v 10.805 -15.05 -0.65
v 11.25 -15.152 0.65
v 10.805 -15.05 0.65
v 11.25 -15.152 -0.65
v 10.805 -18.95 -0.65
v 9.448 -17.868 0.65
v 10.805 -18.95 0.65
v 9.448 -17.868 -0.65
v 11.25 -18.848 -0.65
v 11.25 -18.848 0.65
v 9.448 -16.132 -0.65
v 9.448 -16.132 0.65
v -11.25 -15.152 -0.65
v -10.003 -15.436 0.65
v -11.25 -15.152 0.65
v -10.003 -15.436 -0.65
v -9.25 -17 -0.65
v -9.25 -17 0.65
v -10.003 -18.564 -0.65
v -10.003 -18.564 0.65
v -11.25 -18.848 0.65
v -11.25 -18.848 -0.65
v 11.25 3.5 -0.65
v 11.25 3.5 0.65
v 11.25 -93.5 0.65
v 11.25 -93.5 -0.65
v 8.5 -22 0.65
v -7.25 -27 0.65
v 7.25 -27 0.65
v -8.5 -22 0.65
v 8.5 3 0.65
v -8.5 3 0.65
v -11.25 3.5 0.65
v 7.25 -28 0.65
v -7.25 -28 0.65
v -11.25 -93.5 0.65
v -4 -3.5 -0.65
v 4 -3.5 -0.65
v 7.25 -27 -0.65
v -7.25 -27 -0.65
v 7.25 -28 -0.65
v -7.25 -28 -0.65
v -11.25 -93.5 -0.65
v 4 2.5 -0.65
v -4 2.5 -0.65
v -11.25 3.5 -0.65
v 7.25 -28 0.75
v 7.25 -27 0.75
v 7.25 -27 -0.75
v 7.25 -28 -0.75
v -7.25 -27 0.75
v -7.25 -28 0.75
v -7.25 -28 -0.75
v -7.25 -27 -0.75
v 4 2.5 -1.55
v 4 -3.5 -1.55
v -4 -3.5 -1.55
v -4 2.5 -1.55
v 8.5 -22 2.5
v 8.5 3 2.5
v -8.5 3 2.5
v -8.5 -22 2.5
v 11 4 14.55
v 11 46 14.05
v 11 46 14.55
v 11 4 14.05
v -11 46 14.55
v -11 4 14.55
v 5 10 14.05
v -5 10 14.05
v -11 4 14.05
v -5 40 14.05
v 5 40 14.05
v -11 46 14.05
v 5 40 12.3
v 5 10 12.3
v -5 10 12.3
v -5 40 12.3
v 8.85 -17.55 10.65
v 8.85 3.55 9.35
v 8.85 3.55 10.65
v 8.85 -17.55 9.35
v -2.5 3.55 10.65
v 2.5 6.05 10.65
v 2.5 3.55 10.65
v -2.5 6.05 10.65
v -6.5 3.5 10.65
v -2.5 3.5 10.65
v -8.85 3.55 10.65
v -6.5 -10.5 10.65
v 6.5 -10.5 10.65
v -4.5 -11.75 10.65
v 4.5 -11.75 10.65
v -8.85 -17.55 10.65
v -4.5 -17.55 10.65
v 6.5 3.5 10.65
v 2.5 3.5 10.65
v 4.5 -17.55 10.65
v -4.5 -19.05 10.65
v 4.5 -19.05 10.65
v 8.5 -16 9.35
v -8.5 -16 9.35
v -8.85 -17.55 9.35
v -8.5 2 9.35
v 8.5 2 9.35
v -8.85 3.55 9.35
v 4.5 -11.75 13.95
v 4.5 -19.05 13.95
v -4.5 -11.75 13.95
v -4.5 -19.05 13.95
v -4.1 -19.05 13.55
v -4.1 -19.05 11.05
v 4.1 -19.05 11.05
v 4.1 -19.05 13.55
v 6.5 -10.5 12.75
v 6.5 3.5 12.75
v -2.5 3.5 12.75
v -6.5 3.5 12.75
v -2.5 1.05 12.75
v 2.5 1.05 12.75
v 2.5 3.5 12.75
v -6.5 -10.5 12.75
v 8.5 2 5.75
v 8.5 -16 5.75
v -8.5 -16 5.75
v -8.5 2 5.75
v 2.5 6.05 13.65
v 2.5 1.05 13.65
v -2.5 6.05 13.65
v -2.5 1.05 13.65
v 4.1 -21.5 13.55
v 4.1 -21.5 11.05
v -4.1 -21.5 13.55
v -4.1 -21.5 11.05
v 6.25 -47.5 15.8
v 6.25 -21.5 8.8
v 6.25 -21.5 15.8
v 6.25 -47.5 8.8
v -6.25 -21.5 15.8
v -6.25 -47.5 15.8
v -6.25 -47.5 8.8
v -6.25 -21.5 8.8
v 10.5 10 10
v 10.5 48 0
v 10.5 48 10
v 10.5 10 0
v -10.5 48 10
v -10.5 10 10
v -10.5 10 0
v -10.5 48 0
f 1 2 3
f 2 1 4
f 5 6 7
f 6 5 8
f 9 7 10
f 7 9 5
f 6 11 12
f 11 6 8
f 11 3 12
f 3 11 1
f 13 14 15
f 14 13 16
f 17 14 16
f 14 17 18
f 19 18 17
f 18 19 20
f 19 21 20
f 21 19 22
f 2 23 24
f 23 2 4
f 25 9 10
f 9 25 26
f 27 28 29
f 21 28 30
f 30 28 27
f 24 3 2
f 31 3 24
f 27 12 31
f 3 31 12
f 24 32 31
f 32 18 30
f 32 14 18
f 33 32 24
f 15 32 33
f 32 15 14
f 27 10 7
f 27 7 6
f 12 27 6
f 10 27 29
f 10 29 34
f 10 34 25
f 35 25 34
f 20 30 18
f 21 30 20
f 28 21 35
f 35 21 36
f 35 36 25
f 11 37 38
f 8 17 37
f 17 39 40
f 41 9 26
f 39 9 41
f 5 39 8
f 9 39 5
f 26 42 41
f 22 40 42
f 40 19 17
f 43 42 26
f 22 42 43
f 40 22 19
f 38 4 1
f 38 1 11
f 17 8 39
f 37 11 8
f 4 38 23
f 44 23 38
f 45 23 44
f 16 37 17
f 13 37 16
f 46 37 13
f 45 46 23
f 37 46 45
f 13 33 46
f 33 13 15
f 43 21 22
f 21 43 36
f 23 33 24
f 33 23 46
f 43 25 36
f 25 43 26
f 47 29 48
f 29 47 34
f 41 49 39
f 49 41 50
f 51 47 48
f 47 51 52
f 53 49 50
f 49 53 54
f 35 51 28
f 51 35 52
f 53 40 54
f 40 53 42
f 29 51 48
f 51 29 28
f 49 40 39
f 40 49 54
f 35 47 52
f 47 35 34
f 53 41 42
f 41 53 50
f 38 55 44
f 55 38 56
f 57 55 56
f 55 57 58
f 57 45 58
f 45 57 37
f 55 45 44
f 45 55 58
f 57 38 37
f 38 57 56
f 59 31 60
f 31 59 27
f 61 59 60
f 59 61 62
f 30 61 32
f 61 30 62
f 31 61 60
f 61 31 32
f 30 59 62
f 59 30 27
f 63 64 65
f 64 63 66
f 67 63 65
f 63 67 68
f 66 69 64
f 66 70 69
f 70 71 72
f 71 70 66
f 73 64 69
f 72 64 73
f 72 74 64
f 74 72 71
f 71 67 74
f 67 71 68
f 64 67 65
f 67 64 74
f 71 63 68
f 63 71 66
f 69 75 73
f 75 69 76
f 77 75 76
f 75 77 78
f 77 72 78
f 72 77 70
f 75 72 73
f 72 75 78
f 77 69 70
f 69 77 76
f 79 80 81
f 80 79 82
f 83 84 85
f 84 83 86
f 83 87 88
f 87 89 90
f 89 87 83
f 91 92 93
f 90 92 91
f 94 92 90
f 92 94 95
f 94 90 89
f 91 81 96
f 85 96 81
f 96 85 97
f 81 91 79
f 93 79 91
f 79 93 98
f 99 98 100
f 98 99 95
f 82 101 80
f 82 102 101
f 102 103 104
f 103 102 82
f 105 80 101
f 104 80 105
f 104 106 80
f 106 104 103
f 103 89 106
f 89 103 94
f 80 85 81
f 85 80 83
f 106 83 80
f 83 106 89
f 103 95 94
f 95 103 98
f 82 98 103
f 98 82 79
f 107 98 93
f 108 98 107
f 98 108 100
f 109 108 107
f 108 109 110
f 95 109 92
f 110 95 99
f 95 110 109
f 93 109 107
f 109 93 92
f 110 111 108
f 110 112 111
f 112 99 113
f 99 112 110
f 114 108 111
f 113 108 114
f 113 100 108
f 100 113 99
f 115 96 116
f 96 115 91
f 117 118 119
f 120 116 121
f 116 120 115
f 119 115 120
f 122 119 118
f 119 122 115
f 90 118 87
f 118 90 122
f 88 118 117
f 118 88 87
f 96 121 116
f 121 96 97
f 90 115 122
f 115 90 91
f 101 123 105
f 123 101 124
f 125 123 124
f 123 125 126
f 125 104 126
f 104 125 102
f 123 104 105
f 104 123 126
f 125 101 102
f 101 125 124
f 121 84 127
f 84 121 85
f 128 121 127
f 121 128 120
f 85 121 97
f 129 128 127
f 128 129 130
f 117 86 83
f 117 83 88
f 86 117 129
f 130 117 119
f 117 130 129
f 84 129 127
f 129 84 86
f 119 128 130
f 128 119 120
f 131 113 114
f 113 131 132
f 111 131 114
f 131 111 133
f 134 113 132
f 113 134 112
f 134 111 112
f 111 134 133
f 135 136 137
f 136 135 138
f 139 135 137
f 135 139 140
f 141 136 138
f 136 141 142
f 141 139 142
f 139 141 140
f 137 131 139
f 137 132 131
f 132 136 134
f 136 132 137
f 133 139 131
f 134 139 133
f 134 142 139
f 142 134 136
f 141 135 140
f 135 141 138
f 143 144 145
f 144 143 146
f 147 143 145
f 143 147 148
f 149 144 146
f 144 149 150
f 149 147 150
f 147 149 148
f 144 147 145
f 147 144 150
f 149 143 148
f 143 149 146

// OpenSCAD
use <MCAD/boxes.scad>

//$fn=100;

// large battery 1200mAh : 63
// small battery  600mAh : 38
module battery(length, tol=0) {
    cube([21+tol,length+tol,10+tol],center=true);
}

function inc(arr,tol) = [arr[0]+tol,arr[1]+tol,arr[2]+tol];
function incA(arr,tol) = [arr[0]+tol[0],arr[1]+tol[1],arr[2]+tol[2]];

module esp32(tol=0) {
    pcb=[17.7,21.1,1.3];
    usb=[9,7.3,3.3];
    chip=[13,14,2.1];
    resistors=[17,18,3.6];

    union() {
      // PCB
      cube(inc(pcb, tol), center=true);    
      // USB
      translate([0,-pcb[1]/2+usb[1]/2-1.5,usb[2]/2+pcb[2]/2])
       cube(inc(usb, tol), center=true);    
      // chips
      translate([0,+3.5,chip[2]/2+pcb[2]/2])
       cube(chip, center=true);
      // place for resistors (voltage and battery cables)
      translate([0,0,-resistors[2]/2-pcb[2]/2])
       cube(inc(resistors, tol), center=true);
      // BLE antenna connector
      translate([0,pcb[1]/2,pcb[2]/2+1.5])
       cube(inc([5,5,3], tol), center=true);


    }
}

module antenna(tol=[0,0,0]) {
    union(){        
     cube(incA([22,42,0.5], tol),center=true);
     translate([0,0,-1])        
      cube(incA([10,30,2], tol),center=true);
    }
}

module sensor(tol=0, do_hole=true) {
    pcb=[22.5,97,1.3];
    union() {
      difference() {
        cube(inc(pcb, tol), center=true);    
        if (do_hole) {
          translate([+pcb[0]/2,pcb[1]/2-20.5,0])
            cylinder(6,r=4/2,center=true);
          translate([-pcb[0]/2,pcb[1]/2-20.5,0])
            cylinder(6,r=4/2,center=true);
        }
      }
      // limit line
      translate([0,pcb[1]/2-31,0])
        cube([pcb[0]-8,1,pcb[2]+0.2],center=true);
      // soudures
      translate([0,pcb[1]/2-4,-pcb[2]/2+0.1])
        cube([8,6,2],center=true);
      // chip
      translate([0,pcb[1]/2-13,1.5])
        cube([17,25,2],center=true);
    }
}


module cable(tol=0) {
   translate([0,-4,0])
     cube(inc([8.2,8,2.5],tol),center=true);// usb
   translate([0,-18.9,0])
     cube(inc([12.5,30-4,7],tol),center=true); // plug
}

module model(batt_length, tol=0) {
  translate([0,-45,0])
    sensor(tol);  
    
  translate([0,25,14.3])
    antenna([tol,tol,tol]);    
  translate([0,10+batt_length/2,5])
    battery(batt_length,tol);

  translate([0,0,2]) {
    translate([0,-7,8])
      rotate([0,0,0])
        esp32(tol);
    translate([0,-15.6,10.3])
      cable(tol);
  }
}


batS=38;
batL=63;
model(batS);
